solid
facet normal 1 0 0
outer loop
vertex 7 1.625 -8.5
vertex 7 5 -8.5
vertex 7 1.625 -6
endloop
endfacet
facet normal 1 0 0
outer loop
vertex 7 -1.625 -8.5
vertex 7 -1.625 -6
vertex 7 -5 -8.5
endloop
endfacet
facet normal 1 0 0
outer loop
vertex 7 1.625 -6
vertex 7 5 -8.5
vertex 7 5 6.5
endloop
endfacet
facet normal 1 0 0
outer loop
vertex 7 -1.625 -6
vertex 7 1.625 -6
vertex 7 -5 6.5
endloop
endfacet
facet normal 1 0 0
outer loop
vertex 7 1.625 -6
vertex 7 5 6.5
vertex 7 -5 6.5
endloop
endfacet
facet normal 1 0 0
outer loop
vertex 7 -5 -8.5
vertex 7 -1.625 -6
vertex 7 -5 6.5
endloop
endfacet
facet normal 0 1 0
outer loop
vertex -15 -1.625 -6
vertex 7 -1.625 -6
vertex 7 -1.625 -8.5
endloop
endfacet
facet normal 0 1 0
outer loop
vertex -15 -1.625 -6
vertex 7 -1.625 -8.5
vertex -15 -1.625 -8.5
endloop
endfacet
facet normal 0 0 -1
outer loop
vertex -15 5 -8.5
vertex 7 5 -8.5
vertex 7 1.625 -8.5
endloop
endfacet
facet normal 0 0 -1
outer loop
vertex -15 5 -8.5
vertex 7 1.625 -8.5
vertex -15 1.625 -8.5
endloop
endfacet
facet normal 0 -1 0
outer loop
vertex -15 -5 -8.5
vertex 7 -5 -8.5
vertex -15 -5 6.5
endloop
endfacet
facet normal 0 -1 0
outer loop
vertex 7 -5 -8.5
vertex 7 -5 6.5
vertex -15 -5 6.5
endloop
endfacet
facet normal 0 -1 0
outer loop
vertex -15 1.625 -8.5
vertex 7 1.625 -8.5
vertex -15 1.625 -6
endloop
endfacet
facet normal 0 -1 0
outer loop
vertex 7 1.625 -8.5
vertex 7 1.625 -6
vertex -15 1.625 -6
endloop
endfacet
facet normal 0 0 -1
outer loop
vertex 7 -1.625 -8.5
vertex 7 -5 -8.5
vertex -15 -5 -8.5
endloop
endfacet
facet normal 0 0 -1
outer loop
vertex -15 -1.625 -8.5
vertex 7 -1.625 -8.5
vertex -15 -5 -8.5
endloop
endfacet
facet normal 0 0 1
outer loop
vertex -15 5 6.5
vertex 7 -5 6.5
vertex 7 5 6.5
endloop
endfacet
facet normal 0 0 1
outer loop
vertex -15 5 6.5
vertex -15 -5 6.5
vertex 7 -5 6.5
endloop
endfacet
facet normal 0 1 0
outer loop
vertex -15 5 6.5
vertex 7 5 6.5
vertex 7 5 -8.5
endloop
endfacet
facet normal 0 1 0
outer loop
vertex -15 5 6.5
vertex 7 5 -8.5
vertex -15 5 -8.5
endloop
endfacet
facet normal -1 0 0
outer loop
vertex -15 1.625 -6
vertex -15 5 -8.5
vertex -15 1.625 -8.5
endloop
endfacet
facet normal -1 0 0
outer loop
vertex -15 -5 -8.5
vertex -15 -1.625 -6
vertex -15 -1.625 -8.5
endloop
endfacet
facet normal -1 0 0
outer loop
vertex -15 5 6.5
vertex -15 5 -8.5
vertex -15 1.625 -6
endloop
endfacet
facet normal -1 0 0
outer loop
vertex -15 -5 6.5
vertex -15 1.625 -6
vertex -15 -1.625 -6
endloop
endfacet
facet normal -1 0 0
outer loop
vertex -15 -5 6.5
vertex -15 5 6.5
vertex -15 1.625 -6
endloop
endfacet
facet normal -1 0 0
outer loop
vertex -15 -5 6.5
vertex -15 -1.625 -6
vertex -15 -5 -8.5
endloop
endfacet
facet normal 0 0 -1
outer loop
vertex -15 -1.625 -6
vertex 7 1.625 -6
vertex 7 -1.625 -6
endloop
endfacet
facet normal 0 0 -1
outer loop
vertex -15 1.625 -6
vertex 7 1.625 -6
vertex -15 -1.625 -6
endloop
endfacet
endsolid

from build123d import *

# Parameters (mm, degrees)
SKETCH1_W           = 30
SKETCH1_H           = 10
BOSS_EXTRUDE1_DEPTH = 6.5
SKETCH3_W           = 13
SKETCH3_H           = 22
CUT_EXTRUDE3_DEPTH  = 20.163767897
SKETCH10_W          = 13
SKETCH10_H          = 10
BOSS_EXTRUDE3_DEPTH = 3
SKETCH12_W          = 22
SKETCH12_H          = 3.25
CUT_EXTRUDE5_DEPTH  = 0.5
SKETCH15_W          = 22
SKETCH15_H          = 3.375
BOSS_EXTRUDE6_DEPTH = 2


with BuildPart() as part:
    # Sketch1 → Boss-Extrude1 (new, symmetric)
    with BuildSketch(Plane.XY):
        Rectangle(SKETCH1_W, SKETCH1_H)
    extrude(amount=BOSS_EXTRUDE1_DEPTH, both=True)

    # Sketch3 → Cut-Extrude3 (cut, through all)
    with BuildSketch(Plane.XZ.offset(5)):
        with Locations((10.5, 0)):
            Rectangle(SKETCH3_W, SKETCH3_H)
    extrude(amount=-CUT_EXTRUDE3_DEPTH, mode=Mode.SUBTRACT)

    # Sketch10 → Boss-Extrude3 (add)
    with BuildSketch(Plane(origin=(4, 0, 0), x_dir=(0, 0, -1), z_dir=(1, 0, 0))):
        Rectangle(SKETCH10_W, SKETCH10_H)
    extrude(amount=BOSS_EXTRUDE3_DEPTH)

    # Sketch12 → Cut-Extrude5 (cut)
    with BuildSketch(Plane(origin=(0, 0, -6.5), x_dir=(-1, 0, 0), z_dir=(0, 0, -1))):
        with Locations((4, 0)):
            Rectangle(SKETCH12_W, SKETCH12_H)
    extrude(amount=-CUT_EXTRUDE5_DEPTH, mode=Mode.SUBTRACT)

    # Sketch15 → Boss-Extrude6 (add)
    with BuildSketch(Plane(origin=(0, 0, -6.5), x_dir=(-1, 0, 0), z_dir=(0, 0, -1))):
        with Locations((4, 3.3125)):
            Rectangle(SKETCH15_W, SKETCH15_H)
    boss_extrude6 = extrude(amount=BOSS_EXTRUDE6_DEPTH)

    # Mirror5: Boss-Extrude6 across plane
    add(boss_extrude6.mirror(Plane.ZX))


solid = part.part
